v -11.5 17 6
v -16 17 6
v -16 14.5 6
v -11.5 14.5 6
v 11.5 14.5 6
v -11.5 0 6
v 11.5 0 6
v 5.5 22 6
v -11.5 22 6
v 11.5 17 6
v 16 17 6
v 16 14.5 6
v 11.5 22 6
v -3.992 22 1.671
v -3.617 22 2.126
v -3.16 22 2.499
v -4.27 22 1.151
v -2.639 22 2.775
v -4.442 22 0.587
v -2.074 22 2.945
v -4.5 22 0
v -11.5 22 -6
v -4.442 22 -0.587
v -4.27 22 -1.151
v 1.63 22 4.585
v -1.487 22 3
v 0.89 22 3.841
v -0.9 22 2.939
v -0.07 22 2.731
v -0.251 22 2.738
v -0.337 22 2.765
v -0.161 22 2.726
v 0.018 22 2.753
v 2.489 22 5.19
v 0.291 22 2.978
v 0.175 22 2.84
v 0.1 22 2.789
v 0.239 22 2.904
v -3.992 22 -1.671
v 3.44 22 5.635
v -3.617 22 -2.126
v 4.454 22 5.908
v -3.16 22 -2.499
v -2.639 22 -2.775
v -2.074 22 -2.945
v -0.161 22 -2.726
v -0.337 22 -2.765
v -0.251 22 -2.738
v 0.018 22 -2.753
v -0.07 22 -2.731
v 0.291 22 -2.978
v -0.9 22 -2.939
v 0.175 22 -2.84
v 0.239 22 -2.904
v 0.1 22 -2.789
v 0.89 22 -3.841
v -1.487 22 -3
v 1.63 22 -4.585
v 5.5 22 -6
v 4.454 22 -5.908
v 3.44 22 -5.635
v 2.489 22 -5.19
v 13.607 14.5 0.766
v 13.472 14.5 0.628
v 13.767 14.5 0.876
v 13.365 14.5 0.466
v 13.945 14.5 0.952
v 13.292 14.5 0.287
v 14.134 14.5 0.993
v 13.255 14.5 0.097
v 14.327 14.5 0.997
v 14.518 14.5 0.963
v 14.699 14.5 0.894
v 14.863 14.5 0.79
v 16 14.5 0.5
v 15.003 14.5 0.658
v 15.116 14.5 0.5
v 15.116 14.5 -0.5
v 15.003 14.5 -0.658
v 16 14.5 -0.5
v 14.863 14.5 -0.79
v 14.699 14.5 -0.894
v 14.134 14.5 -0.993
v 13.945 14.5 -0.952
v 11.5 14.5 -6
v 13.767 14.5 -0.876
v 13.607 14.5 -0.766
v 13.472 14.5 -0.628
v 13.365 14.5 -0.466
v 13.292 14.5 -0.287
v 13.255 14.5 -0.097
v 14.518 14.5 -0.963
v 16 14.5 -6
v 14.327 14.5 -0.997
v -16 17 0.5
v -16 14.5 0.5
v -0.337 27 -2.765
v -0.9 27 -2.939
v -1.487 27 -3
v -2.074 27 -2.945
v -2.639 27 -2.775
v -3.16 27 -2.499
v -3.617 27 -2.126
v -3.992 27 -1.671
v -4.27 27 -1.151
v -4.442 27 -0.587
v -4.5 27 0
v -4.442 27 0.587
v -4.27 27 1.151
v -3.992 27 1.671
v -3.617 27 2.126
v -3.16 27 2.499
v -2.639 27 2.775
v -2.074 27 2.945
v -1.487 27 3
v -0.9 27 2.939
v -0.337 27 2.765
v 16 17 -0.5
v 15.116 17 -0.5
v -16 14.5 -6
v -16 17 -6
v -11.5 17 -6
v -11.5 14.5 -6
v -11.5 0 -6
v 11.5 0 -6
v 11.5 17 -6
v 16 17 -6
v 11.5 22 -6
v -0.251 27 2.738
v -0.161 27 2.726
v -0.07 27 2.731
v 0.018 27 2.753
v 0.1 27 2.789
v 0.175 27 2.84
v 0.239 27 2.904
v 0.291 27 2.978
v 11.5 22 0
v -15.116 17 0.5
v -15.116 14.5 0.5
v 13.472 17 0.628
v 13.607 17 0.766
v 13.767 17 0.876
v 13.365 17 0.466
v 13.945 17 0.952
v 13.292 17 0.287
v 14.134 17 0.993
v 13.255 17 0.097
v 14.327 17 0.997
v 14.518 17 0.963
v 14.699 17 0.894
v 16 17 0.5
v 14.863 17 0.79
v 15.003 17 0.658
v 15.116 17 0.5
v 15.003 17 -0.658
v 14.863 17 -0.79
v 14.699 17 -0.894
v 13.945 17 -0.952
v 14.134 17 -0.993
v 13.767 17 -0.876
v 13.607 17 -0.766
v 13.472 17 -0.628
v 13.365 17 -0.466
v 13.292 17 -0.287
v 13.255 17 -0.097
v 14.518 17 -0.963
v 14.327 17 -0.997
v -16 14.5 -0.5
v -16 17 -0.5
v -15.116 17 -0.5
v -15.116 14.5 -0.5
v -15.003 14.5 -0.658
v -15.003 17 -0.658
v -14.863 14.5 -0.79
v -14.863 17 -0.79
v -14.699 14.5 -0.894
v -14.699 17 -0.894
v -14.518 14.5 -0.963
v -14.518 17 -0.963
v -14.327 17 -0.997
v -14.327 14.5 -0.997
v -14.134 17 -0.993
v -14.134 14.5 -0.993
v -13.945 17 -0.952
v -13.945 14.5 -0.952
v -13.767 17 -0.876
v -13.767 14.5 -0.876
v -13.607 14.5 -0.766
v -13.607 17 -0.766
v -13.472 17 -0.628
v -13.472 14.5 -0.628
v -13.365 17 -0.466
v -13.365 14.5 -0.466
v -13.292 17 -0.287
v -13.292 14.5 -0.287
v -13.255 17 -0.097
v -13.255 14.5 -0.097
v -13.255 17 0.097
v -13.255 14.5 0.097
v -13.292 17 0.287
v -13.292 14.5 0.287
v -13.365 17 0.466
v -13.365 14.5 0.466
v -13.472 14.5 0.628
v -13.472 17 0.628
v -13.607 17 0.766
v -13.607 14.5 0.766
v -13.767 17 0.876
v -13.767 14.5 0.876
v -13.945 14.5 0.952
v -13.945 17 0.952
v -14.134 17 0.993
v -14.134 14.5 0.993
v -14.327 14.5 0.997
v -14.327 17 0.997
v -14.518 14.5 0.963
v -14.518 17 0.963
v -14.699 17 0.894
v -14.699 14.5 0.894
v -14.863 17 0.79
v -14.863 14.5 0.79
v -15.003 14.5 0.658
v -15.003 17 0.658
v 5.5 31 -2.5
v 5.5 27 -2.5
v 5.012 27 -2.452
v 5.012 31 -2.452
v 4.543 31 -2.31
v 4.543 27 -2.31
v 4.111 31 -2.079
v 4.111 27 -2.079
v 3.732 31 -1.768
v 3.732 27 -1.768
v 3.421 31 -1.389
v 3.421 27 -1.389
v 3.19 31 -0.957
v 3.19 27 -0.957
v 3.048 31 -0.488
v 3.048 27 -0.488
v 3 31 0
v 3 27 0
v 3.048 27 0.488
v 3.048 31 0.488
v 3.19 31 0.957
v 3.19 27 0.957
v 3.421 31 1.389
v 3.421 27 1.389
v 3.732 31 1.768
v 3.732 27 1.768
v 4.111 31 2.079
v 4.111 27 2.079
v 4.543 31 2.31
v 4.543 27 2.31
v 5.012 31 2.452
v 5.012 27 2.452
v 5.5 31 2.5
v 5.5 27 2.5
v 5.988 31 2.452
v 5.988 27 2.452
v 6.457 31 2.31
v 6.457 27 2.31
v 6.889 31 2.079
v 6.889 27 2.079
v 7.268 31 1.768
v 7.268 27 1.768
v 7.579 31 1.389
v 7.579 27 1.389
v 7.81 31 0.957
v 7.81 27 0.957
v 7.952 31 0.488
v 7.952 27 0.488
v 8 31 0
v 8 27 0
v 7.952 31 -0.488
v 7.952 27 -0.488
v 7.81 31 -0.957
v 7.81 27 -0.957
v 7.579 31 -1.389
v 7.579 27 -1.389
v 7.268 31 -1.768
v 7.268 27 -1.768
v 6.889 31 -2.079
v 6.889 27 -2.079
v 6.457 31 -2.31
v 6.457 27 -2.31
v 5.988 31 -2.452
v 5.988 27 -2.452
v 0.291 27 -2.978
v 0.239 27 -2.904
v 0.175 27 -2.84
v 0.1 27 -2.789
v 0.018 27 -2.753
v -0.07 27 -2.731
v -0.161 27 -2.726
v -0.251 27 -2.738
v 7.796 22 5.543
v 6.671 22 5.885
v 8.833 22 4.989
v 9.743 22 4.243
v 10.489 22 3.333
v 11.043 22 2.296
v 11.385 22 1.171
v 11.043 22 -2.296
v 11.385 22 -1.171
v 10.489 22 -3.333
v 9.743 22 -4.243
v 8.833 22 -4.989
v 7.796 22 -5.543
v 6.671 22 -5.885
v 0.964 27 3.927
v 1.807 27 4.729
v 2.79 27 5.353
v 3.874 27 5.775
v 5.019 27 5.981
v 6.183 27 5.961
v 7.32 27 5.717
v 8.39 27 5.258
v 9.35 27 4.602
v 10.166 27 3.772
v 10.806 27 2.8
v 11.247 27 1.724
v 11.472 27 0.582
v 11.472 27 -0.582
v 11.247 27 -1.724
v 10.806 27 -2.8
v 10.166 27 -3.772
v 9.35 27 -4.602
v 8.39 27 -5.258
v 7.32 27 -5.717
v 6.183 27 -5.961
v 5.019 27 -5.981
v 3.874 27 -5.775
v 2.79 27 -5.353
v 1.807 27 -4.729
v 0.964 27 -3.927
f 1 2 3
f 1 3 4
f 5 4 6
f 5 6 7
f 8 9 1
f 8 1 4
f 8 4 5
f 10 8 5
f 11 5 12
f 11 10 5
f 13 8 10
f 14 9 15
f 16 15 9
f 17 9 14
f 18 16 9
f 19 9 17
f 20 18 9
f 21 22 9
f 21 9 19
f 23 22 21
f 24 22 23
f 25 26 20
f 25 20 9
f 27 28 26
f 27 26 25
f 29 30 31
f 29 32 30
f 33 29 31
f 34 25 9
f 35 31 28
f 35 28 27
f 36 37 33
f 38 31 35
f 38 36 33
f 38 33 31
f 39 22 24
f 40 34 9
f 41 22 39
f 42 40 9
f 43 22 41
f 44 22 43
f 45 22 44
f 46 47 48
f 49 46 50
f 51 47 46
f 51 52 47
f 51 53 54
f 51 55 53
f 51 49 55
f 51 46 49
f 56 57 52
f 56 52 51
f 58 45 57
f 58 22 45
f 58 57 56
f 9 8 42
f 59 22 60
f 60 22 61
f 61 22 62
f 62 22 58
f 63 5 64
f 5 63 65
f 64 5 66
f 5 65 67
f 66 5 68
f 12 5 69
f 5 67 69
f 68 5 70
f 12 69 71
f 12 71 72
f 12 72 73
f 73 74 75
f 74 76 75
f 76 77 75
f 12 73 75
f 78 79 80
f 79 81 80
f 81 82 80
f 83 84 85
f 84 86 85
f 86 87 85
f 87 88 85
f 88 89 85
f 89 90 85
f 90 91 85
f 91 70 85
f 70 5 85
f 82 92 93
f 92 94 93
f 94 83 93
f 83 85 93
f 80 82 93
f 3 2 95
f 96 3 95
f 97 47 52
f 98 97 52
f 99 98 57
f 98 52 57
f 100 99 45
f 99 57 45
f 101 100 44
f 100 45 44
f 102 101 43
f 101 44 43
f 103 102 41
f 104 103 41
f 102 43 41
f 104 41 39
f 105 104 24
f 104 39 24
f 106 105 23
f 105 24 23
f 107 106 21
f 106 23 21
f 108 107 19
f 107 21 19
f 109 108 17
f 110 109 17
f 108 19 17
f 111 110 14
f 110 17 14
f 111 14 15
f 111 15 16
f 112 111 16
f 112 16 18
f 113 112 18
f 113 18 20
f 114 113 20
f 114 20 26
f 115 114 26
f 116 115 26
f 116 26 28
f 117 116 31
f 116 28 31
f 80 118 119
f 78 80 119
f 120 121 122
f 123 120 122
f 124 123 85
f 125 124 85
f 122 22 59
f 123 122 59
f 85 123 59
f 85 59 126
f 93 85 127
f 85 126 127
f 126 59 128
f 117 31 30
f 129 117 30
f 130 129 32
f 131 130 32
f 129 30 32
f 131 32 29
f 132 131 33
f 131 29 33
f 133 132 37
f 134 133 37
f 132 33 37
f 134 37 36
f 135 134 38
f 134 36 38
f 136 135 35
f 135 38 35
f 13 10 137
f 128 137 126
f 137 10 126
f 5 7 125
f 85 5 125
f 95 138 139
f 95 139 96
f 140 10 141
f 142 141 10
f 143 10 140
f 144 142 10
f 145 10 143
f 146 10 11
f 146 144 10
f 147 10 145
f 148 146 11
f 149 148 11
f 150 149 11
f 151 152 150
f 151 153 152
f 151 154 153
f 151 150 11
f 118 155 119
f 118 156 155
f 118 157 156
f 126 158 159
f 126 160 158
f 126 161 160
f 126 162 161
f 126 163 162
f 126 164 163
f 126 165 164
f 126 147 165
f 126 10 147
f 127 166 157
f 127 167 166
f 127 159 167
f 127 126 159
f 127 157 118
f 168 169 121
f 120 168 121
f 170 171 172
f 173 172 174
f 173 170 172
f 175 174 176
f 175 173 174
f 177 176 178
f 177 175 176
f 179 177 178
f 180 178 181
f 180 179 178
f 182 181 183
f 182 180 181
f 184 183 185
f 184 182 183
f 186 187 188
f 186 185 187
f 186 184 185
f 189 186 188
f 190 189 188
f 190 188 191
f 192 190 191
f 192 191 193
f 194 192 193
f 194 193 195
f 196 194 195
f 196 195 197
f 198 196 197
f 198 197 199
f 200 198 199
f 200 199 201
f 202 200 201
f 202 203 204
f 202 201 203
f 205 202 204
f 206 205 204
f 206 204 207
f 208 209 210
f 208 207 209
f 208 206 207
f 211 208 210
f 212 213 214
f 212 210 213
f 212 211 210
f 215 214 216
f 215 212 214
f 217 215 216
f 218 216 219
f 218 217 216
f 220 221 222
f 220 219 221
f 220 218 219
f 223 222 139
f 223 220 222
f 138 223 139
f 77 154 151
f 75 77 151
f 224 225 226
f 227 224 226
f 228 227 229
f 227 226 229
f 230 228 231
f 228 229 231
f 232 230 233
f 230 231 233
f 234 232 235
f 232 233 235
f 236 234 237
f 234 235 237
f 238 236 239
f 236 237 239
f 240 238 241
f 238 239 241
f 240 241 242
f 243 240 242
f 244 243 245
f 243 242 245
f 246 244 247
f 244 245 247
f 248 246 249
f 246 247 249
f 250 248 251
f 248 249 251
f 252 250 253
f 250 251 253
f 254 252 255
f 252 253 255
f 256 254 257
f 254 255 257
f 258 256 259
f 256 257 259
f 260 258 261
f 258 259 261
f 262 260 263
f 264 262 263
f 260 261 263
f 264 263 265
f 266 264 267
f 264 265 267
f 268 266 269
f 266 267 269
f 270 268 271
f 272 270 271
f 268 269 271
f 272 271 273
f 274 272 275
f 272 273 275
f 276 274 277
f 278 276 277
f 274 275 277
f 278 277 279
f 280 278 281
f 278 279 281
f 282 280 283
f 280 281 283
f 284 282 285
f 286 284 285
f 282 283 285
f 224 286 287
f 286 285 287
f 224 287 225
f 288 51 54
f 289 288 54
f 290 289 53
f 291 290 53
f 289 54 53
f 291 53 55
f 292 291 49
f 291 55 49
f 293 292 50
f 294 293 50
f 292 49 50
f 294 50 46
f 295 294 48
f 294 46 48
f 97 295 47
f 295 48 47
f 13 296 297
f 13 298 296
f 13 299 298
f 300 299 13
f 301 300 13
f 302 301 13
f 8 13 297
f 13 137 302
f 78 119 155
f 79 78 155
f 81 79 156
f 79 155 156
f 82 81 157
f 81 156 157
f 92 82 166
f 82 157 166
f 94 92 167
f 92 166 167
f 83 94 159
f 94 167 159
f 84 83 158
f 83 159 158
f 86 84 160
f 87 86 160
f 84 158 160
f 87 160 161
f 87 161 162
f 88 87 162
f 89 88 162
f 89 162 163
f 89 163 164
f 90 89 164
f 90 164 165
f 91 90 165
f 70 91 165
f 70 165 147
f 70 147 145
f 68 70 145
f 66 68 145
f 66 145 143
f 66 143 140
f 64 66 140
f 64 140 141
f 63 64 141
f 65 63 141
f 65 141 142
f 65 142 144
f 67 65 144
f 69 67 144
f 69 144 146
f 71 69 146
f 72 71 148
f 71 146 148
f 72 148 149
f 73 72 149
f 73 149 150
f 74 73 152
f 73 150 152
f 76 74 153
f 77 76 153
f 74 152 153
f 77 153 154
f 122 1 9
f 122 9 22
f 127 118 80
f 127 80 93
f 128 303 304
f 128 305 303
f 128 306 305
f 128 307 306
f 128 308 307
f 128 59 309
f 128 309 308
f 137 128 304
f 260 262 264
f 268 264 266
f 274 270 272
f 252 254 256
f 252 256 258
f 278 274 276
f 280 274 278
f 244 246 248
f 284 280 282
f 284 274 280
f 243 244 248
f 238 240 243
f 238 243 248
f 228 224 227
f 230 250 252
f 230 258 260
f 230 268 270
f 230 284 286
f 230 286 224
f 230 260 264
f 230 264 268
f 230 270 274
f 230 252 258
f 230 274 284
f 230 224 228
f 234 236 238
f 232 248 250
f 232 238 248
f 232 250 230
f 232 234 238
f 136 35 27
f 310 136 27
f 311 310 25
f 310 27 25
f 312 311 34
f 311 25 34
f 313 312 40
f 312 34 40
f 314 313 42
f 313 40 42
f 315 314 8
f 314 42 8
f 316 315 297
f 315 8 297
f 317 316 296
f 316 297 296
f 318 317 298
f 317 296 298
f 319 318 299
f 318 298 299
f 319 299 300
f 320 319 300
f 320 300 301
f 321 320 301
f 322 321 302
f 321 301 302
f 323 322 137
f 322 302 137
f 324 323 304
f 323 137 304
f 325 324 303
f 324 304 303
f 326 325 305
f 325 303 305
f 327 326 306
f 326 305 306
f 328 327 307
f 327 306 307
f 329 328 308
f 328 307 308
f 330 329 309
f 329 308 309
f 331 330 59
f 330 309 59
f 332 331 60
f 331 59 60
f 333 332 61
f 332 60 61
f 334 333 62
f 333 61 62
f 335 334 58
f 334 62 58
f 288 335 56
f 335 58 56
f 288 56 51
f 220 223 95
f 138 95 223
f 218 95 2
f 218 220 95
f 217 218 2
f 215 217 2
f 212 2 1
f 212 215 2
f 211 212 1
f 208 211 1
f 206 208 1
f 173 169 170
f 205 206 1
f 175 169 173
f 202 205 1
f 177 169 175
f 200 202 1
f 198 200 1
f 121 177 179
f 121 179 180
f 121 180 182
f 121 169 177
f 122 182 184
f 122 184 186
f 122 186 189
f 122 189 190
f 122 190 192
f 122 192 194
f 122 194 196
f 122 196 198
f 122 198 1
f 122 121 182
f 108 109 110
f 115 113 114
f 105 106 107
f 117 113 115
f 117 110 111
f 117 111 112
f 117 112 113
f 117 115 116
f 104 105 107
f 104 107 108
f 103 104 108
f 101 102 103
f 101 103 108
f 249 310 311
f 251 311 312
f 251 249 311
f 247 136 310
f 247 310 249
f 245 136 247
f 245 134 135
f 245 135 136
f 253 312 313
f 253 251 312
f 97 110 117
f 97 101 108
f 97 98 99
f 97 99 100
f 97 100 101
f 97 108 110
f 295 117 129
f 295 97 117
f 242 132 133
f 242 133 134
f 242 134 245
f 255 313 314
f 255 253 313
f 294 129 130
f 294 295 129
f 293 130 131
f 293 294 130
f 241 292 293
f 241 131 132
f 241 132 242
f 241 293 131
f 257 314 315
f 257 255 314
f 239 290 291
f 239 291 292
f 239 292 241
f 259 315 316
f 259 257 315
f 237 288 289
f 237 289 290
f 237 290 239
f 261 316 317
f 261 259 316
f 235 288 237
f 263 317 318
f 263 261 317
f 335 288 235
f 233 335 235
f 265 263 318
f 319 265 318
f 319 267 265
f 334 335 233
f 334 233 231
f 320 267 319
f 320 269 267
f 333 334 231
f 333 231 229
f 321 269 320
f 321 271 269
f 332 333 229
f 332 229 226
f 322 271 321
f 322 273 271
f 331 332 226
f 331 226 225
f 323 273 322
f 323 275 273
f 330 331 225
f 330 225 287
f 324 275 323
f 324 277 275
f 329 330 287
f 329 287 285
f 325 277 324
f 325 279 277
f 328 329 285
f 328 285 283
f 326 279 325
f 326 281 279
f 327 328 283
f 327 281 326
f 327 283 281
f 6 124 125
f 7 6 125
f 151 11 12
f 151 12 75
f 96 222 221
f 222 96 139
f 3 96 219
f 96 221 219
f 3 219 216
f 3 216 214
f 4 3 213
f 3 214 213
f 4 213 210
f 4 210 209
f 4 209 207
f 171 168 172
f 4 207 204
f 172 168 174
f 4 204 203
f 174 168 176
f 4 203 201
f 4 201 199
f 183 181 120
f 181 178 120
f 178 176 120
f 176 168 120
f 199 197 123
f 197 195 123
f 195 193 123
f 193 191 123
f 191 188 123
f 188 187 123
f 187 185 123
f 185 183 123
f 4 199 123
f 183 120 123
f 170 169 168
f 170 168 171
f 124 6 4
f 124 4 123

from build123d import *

# Parameters (mm, degrees)
SKETCH_1_W          = 23
SKETCH_1_H          = 12
EXTRUDE_1_DEPTH     = 22
SKETCH_2_W          = 32
SKETCH_2_H          = 12
EXTRUDE_2_DEPTH     = 2.5
CUT_EXTRUDE_1_DEPTH = 25.103941586
EXTRUDE_3_DEPTH     = 5
SKETCH_5_R          = 2.5
EXTRUDE_4_DEPTH     = 4


with BuildPart() as part:
    # 草图1 → 凸台-拉伸1 (new body)
    with BuildSketch(Plane(origin=(0, 0, 0), x_dir=(1, 0, 0), z_dir=(0, 1, 0))):
        Rectangle(SKETCH_1_W, SKETCH_1_H)
    extrude(amount=EXTRUDE_1_DEPTH)

    # 草图2 → 凸台-拉伸2 (add)
    with BuildSketch(Plane(origin=(0, 17, 0), x_dir=(1, 0, 0), z_dir=(0, 1, 0))):
        Rectangle(SKETCH_2_W, SKETCH_2_H)
    extrude(amount=-EXTRUDE_2_DEPTH)

    # 草图3 → 切除-拉伸1 (cut, through all)
    with BuildSketch(Plane(origin=(0, 17, 0), x_dir=(1, 0, 0), z_dir=(0, 1, 0))):
        with BuildLine():
            Line((-16, 0.5), (-15.116025404, 0.5))
            ThreePointArc((-15.116025404, 0.5), (-13.25, 0), (-15.116025404, -0.5))
            Line((-15.116025404, -0.5), (-16, -0.5))
            Line((-16, -0.5), (-16, 0.5))
        make_face()
    cut_extrude_1 = extrude(amount=-CUT_EXTRUDE_1_DEPTH, mode=Mode.SUBTRACT)

    # 镜向1: 切除-拉伸1 across plane
    add(cut_extrude_1.mirror(Plane(origin=(0, 0, 0), x_dir=(0, 0, 1), z_dir=(1, 0, 0))), mode=Mode.SUBTRACT)

    # 草图4 → 凸台-拉伸3 (add)
    with BuildSketch(Plane(origin=(0, 22, 0), x_dir=(1, 0, 0), z_dir=(0, 1, 0))):
        with BuildLine():
            ThreePointArc((0.291208791, -2.978001703), (11.5, 0), (0.291208791, 2.978001703))
            ThreePointArc((0.291208791, 2.978001703), (0.017562524, 2.752601694), (-0.336734694, 2.765287296))
            ThreePointArc((-0.336734694, 2.765287296), (-4.5, 0), (-0.336734694, -2.765287296))
            ThreePointArc((-0.336734694, -2.765287296), (0.017562524, -2.752601694), (0.291208791, -2.978001703))
        make_face()
    extrude(amount=EXTRUDE_3_DEPTH)

    # 草图5 → 凸台-拉伸4 (add)
    with BuildSketch(Plane(origin=(0, 27, 0), x_dir=(1, 0, 0), z_dir=(0, 1, 0))):
        with Locations(Location((5.5, 0, 0), (0, 0, 90))):
            Circle(SKETCH_5_R)
    extrude(amount=EXTRUDE_4_DEPTH)


solid = part.part
